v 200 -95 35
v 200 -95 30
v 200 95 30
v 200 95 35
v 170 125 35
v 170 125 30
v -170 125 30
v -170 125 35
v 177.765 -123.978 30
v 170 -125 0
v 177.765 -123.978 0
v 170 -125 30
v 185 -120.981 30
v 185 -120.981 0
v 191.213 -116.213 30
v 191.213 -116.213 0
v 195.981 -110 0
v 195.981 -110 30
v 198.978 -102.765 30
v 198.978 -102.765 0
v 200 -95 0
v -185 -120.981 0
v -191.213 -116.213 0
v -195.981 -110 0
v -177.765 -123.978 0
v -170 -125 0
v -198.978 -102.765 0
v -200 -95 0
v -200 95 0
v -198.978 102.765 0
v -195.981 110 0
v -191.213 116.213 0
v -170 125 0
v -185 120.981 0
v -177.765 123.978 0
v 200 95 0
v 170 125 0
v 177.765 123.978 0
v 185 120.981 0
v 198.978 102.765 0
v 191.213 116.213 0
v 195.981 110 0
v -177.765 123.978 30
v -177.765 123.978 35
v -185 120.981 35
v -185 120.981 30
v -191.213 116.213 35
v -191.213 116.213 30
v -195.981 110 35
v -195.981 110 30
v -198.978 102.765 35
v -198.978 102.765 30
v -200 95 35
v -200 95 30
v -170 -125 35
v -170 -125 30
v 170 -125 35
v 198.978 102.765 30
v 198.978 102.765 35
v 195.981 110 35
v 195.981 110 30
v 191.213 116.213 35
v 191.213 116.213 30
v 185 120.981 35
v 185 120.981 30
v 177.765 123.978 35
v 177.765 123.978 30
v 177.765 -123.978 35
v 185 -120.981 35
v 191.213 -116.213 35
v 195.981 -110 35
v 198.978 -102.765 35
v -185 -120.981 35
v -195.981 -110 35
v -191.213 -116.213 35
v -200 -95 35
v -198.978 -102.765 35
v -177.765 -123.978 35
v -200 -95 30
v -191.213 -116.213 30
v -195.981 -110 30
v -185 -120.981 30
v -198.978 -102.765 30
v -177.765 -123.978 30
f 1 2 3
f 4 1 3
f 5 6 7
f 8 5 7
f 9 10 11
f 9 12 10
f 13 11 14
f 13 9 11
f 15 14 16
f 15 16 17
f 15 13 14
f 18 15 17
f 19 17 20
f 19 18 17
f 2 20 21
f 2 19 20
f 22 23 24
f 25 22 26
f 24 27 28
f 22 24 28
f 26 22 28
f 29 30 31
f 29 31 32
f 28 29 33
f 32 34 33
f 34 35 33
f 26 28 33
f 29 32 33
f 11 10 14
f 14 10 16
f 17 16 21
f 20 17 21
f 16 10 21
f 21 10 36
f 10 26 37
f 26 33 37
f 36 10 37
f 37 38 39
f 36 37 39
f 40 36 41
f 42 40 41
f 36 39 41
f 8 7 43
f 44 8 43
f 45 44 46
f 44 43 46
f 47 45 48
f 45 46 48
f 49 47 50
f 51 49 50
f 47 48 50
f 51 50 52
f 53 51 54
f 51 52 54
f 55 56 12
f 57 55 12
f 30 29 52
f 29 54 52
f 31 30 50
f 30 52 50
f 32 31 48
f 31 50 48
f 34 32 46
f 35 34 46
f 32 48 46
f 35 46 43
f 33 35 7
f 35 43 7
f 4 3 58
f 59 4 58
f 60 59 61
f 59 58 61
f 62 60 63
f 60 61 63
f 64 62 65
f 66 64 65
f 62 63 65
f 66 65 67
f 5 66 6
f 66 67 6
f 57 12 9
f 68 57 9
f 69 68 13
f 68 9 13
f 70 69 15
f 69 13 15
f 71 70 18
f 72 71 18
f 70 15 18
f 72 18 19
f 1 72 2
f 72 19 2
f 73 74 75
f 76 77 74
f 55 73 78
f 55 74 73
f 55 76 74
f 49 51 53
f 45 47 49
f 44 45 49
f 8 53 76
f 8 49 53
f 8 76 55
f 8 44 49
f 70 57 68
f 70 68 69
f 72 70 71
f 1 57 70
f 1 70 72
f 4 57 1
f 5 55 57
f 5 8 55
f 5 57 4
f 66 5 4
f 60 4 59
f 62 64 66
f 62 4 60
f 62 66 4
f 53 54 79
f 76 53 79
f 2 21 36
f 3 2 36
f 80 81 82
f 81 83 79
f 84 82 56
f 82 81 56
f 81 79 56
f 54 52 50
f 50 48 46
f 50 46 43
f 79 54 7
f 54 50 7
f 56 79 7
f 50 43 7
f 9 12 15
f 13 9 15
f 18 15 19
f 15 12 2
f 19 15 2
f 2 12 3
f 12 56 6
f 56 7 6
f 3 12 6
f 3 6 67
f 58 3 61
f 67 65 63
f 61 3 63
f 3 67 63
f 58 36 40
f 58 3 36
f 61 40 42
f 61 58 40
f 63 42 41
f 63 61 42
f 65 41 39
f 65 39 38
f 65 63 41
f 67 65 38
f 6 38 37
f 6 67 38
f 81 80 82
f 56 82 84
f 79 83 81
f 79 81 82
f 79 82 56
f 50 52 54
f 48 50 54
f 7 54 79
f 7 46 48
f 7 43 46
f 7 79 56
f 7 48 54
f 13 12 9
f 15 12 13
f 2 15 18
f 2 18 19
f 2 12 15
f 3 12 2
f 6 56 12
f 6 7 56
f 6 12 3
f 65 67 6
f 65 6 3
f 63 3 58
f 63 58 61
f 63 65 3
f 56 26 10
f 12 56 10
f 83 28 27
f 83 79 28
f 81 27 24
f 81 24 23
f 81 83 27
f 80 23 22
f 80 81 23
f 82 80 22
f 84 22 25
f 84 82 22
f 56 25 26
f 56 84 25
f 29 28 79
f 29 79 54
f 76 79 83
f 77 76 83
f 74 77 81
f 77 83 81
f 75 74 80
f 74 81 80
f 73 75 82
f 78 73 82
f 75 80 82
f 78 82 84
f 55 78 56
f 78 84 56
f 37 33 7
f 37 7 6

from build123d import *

# Parameters (mm, degrees)
F0_W     = 400
F0_H     = 250
F1_DEPTH = 30
F2_R     = 30
F3_DEPTH = 5


with BuildPart() as f1:
    # F0 (on Top) → F1 (new body)
    with BuildSketch(Plane.XY):
        Rectangle(F0_W, F0_H)
    extrude(amount=F1_DEPTH)

    # F2
    f2_edges = [f1.edges().sort_by_distance(p)[0] for p in [
        (-200, -125, 15),
        (200, -125, 15),
        (200, 125, 15),
        (-200, 125, 15),
    ]]
    fillet(f2_edges, radius=F2_R)


with BuildPart() as f3:
    # F1_face (on face) → F3 (new body)
    with BuildSketch(Plane.XY.offset(30)):
        with BuildLine():
            Line((-170, -125), (170, -125))
            ThreePointArc((170, -125), (191.213203, -116.213203), (200, -95))
            Line((200, -95), (200, 95))
            ThreePointArc((200, 95), (191.213203, 116.213203), (170, 125))
            Line((170, 125), (-170, 125))
            ThreePointArc((-170, 125), (-191.213203, 116.213203), (-200, 95))
            Line((-200, 95), (-200, -95))
            ThreePointArc((-200, -95), (-191.213203, -116.213203), (-170, -125))
        make_face()
    extrude(amount=F3_DEPTH)


solid = Compound([f1.part, f3.part])
